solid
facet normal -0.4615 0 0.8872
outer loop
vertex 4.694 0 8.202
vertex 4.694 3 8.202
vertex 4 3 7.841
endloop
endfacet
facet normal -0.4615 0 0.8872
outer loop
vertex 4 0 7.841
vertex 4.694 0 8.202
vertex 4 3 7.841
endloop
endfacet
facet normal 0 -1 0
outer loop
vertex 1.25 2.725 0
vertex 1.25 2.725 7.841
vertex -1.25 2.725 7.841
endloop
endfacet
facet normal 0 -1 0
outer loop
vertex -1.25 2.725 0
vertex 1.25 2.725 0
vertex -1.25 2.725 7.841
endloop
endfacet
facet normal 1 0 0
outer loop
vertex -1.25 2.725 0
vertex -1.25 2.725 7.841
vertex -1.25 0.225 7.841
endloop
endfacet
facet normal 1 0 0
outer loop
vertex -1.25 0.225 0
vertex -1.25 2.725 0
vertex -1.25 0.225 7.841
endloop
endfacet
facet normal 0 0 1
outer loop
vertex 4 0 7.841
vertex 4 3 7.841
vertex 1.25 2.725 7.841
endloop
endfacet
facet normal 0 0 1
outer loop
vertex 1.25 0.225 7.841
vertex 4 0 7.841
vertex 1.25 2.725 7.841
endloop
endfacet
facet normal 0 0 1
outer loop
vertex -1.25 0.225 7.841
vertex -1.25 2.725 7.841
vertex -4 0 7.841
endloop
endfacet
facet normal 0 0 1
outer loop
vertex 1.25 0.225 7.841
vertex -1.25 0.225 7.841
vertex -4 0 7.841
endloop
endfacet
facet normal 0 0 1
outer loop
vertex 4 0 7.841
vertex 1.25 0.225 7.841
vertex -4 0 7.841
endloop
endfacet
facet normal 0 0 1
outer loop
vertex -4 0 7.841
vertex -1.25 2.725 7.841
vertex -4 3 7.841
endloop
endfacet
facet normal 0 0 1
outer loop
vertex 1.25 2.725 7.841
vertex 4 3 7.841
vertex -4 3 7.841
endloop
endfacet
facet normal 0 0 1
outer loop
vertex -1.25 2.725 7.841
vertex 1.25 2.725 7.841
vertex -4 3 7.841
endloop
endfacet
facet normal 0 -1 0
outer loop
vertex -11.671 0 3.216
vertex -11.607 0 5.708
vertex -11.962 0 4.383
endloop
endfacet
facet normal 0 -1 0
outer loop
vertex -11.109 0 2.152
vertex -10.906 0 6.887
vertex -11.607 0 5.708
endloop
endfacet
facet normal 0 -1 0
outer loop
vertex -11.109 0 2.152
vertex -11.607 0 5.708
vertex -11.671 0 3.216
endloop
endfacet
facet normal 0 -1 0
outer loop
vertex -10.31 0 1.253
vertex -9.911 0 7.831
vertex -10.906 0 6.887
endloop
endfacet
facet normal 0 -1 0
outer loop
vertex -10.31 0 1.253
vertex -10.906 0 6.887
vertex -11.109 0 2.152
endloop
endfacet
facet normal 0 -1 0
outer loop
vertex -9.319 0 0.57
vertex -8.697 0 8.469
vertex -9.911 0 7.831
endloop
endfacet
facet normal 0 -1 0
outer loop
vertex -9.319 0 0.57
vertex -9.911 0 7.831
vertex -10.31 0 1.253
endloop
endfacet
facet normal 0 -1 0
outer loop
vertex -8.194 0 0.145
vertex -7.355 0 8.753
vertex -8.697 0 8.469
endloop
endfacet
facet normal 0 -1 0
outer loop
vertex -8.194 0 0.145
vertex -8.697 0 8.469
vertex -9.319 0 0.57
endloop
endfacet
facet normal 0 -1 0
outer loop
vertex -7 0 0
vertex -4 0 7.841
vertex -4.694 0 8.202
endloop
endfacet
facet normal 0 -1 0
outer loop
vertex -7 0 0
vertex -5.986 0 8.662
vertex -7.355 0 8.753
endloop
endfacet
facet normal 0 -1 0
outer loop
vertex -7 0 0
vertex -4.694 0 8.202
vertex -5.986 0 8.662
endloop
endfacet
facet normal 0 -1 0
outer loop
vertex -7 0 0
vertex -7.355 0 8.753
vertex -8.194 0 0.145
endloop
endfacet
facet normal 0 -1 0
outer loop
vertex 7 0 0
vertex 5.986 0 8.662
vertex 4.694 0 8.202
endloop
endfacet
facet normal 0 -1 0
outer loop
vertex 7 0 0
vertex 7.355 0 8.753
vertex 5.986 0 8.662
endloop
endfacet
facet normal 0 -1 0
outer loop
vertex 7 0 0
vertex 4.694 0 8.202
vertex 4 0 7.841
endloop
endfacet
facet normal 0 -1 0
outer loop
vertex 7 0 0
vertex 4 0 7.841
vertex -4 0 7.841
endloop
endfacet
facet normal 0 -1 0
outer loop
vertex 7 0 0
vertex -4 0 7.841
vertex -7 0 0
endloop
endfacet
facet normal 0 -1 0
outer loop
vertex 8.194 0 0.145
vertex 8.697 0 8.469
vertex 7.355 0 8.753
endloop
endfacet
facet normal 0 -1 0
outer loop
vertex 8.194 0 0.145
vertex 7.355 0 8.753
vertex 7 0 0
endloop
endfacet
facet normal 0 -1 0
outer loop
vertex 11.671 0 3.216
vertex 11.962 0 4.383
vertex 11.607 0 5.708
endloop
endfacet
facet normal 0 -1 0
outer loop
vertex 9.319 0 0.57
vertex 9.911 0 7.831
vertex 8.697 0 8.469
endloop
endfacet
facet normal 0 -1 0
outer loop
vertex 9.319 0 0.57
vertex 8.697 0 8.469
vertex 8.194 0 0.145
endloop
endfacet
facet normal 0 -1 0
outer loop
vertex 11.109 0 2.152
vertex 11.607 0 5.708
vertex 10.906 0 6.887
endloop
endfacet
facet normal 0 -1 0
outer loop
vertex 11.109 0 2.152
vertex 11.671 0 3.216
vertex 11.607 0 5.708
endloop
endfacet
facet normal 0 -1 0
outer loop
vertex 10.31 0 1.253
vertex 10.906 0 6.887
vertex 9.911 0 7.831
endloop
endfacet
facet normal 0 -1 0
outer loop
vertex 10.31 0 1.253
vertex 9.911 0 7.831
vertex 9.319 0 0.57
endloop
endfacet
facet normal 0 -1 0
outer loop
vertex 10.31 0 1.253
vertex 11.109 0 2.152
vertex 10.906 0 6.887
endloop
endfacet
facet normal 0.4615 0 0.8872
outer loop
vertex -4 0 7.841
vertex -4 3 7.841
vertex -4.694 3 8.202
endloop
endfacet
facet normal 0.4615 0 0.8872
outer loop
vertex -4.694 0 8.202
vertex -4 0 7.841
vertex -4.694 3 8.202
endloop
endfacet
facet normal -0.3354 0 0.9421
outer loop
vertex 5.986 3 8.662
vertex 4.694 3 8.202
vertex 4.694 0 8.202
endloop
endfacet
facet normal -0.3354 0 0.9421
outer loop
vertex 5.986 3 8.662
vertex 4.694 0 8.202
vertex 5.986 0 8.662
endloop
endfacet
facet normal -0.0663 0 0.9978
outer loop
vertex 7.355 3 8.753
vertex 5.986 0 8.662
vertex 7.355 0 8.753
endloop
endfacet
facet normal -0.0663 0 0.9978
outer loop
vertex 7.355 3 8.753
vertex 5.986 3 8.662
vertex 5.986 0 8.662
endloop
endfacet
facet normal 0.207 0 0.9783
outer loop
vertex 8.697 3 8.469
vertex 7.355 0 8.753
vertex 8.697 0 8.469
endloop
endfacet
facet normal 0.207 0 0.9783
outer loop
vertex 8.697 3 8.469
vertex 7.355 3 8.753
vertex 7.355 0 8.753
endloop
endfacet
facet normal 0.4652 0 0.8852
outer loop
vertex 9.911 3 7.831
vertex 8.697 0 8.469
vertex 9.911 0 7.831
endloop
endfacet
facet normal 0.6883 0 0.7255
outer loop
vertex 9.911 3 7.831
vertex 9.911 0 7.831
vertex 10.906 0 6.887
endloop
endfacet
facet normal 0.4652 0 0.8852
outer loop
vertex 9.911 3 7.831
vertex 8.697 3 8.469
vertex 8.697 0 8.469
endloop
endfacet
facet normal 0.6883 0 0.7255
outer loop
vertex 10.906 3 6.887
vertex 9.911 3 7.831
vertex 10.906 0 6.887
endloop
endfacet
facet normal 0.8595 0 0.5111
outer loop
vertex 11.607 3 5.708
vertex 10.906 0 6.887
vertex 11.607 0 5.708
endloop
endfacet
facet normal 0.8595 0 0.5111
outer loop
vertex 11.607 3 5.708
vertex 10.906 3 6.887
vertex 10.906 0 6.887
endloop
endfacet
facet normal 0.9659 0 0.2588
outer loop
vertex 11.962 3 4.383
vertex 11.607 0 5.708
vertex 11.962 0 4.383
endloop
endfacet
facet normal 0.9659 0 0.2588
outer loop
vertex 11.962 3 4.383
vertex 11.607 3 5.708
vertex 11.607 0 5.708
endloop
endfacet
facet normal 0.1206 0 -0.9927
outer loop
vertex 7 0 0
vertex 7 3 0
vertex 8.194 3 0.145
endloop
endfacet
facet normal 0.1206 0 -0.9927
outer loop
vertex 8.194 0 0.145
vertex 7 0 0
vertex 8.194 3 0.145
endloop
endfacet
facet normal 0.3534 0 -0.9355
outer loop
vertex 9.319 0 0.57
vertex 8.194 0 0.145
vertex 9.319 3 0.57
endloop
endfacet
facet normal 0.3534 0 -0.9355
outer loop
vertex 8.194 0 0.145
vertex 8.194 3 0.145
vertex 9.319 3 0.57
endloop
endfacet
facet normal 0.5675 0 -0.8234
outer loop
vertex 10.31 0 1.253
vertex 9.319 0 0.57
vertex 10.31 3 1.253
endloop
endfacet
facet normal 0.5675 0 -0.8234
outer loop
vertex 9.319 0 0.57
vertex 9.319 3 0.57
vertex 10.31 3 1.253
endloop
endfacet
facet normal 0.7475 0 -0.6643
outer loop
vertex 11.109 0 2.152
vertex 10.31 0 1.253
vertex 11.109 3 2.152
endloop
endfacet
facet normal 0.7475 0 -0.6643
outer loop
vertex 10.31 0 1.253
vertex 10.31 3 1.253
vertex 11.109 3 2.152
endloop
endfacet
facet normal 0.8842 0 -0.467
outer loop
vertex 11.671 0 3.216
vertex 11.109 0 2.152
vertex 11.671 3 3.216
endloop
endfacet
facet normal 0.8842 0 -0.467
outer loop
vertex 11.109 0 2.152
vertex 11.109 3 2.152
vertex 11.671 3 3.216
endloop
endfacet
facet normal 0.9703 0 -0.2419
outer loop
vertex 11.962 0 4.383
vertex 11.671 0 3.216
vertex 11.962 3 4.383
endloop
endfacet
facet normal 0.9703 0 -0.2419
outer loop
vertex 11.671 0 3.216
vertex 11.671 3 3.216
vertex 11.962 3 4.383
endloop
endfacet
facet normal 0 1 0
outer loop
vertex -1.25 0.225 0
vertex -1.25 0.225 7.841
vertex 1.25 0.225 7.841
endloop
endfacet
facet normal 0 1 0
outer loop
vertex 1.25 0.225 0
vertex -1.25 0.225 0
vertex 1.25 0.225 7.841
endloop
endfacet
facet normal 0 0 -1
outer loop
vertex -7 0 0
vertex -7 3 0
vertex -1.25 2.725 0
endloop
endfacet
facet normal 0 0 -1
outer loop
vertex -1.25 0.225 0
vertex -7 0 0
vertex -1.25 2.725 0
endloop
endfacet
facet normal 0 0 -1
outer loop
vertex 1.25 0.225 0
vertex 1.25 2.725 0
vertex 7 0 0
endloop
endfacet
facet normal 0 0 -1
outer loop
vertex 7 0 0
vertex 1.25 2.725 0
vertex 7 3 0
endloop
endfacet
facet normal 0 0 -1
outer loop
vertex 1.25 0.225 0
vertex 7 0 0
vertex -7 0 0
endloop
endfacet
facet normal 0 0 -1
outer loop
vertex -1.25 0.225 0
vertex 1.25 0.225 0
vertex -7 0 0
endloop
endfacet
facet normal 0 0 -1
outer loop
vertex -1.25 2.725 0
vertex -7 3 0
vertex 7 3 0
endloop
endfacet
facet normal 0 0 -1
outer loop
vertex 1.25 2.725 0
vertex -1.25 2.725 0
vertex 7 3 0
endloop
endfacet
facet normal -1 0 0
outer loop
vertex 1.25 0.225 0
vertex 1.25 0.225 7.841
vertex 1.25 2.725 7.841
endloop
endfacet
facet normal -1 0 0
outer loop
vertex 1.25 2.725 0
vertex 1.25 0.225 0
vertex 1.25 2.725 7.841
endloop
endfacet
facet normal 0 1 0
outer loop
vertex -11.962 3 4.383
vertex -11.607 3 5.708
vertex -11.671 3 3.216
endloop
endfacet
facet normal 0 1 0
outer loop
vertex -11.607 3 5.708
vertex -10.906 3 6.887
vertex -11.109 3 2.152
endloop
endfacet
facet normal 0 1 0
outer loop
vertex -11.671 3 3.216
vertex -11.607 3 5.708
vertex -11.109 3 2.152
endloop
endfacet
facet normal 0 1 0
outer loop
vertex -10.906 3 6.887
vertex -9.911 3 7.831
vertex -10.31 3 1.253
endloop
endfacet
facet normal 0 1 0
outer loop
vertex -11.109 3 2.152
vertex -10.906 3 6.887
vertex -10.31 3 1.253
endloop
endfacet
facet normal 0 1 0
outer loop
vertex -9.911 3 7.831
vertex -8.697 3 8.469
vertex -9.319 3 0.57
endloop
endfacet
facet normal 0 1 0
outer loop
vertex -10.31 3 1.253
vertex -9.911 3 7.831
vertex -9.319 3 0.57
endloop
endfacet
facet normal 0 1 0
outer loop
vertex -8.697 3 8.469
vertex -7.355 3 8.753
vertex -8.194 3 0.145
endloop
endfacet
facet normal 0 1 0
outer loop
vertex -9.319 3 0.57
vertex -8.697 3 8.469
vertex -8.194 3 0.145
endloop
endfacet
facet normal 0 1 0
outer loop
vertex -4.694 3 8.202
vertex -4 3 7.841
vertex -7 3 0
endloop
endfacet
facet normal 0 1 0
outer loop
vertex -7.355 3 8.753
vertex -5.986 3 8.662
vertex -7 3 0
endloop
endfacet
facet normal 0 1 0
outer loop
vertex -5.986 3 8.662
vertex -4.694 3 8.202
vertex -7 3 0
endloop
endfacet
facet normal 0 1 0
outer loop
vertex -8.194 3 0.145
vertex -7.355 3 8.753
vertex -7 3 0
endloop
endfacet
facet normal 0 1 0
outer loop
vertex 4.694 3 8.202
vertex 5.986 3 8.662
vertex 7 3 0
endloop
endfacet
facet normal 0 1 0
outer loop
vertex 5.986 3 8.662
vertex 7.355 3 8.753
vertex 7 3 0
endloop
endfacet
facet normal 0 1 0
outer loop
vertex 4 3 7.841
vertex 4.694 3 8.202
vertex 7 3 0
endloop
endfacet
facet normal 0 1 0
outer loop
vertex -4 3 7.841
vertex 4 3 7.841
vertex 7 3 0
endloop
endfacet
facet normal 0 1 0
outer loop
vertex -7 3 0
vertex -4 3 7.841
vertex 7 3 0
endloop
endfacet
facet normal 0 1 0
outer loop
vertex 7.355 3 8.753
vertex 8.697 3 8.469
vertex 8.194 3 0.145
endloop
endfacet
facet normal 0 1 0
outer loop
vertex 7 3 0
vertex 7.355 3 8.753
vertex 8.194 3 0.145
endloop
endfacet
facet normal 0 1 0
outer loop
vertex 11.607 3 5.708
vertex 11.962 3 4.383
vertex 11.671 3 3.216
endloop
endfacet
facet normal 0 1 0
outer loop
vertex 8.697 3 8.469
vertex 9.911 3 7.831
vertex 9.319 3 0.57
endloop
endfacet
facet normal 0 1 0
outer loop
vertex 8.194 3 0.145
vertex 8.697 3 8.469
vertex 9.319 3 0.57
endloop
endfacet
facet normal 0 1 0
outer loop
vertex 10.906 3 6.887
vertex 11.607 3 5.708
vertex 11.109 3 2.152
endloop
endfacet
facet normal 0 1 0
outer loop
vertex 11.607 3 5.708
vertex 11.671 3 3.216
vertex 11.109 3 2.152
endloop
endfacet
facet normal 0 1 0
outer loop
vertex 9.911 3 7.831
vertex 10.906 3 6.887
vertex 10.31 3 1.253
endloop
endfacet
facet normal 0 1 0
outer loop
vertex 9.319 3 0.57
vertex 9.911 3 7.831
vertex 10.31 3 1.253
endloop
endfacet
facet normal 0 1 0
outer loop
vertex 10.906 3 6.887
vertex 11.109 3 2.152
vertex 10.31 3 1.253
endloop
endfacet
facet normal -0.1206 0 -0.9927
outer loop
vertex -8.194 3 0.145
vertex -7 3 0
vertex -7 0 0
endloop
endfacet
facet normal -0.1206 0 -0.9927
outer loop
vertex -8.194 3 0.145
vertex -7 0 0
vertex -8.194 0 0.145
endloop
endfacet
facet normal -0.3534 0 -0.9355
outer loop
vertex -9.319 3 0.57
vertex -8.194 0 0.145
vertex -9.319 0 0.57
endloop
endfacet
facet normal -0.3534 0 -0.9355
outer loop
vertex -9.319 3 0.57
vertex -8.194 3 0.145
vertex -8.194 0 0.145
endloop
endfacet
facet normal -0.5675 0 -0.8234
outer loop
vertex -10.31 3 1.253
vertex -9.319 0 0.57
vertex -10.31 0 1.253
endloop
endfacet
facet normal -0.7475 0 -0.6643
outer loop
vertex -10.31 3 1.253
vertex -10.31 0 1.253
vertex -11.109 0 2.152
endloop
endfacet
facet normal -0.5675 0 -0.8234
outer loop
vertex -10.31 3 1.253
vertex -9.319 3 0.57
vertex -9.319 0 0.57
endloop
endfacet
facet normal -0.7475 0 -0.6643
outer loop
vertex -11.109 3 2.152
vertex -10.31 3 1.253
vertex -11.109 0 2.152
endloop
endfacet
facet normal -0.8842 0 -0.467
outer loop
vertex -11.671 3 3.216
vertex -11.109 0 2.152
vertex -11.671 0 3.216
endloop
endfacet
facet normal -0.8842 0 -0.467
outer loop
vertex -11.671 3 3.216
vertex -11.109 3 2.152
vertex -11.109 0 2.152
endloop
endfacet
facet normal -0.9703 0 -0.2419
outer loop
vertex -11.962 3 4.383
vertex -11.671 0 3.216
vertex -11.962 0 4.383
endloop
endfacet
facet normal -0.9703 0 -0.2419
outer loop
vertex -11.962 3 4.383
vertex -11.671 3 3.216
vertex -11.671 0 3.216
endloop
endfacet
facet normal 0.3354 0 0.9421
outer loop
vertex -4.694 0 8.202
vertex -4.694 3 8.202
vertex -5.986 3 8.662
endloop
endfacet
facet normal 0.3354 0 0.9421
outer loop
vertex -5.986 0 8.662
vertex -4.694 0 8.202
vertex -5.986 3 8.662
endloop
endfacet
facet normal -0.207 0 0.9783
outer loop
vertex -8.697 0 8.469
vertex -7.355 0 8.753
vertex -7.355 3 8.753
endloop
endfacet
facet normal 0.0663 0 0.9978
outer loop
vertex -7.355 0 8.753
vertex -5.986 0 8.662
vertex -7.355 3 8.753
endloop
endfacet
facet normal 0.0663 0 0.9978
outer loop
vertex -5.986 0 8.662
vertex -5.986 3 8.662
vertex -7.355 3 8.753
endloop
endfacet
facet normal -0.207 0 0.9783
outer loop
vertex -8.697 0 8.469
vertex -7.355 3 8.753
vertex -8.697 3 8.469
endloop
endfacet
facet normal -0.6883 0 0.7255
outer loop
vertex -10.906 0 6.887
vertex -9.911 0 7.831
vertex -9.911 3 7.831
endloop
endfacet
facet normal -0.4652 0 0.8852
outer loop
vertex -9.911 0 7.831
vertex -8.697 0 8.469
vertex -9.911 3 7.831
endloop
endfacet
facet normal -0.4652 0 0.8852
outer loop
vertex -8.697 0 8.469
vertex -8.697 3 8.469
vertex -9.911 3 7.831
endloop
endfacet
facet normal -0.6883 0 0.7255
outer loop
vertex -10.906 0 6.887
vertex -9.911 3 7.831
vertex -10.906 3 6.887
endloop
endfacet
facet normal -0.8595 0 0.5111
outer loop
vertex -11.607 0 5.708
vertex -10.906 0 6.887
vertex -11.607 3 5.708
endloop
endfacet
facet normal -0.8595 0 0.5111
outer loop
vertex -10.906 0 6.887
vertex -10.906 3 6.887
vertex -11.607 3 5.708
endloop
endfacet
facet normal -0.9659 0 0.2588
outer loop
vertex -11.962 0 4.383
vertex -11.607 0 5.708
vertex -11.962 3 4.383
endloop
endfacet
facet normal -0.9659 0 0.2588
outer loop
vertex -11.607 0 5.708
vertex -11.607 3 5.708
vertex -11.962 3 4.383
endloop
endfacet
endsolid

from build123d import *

# Parameters (mm, degrees)
F3_T1_DEPTH = 28
F3_T3_DEPTH = 44.1725614133
F5_W        = 2.5
F5_H        = 2.5


# Not quite as in the source:
# - a fillet or chamfer that OpenCascade refuses, or shapes differently, is made with other operations: its cross-section is extruded or revolved along the edge and cut away or added
# - two fillets or chamfers of one size are made in one step


with BuildPart() as f2:
    # F2: sweep along a path in F1
    with BuildLine(Plane.XY) as f2_path:
        Line((0, 0), (0, 3))
    # F0 (on Front) → F2 (sweep)
    with BuildSketch(Plane.XZ):
        Polygon((-12, 0), (0, 0), (12, 0), (12, 12), (4, 7.8411921859), (0, 7.8411921859), (-4, 7.8411921859), (-12, 12), align=None)
    sweep(path=f2_path.line)

    # F3: fillet of radius 5 on 4 edges, made by hand

    # F3_s2 → F3_t1 (cut)
    with BuildSketch(Plane.XZ.offset(-15.5)):
        with BuildLine():
            ThreePointArc((-7, 0), (-10.5355339059, 1.4644660941), (-12, 5))
            Line((-12, 5), (-12, 0))
            Line((-12, 0), (-7, 0))
        make_face()
        with BuildLine():
            ThreePointArc((7, 0), (10.5355339059, 1.4644660941), (12, 5))
            Line((12, 5), (12, 0))
            Line((12, 0), (7, 0))
        make_face()
    extrude(amount=F3_T1_DEPTH, mode=Mode.SUBTRACT)

    # F3_s4 → F3_t3 (cut)
    with BuildSketch(Plane.XZ.offset(-23.5862807066)):
        with BuildLine():
            ThreePointArc((-4.6937567356, 8.2018423025), (-9.5950706809, 8.0393159966), (-12, 3.7654877173))
            Line((-12, 3.7654877173), (-12, 12))
            Line((-12, 12), (-4.6937567356, 8.2018423025))
        make_face()
        with BuildLine():
            ThreePointArc((4.6937567356, 8.2018423025), (9.5950706809, 8.0393159966), (12, 3.7654877173))
            Line((12, 3.7654877173), (12, 12))
            Line((12, 12), (4.6937567356, 8.2018423025))
        make_face()
    extrude(amount=F3_T3_DEPTH, mode=Mode.SUBTRACT)

    # F7: sweep along a path in F6
    with BuildLine(Plane.XZ) as f7_path:
        Line((0, -1.2934210245), (0, 11.7065789755))
    # F5 (on Top) → F7 (sweep, cut)
    with BuildSketch(Plane.XY):
        with Locations((0, 1.4747590758)):
            Rectangle(F5_W, F5_H)
    sweep(path=f7_path.line, mode=Mode.SUBTRACT)


solid = f2.part
